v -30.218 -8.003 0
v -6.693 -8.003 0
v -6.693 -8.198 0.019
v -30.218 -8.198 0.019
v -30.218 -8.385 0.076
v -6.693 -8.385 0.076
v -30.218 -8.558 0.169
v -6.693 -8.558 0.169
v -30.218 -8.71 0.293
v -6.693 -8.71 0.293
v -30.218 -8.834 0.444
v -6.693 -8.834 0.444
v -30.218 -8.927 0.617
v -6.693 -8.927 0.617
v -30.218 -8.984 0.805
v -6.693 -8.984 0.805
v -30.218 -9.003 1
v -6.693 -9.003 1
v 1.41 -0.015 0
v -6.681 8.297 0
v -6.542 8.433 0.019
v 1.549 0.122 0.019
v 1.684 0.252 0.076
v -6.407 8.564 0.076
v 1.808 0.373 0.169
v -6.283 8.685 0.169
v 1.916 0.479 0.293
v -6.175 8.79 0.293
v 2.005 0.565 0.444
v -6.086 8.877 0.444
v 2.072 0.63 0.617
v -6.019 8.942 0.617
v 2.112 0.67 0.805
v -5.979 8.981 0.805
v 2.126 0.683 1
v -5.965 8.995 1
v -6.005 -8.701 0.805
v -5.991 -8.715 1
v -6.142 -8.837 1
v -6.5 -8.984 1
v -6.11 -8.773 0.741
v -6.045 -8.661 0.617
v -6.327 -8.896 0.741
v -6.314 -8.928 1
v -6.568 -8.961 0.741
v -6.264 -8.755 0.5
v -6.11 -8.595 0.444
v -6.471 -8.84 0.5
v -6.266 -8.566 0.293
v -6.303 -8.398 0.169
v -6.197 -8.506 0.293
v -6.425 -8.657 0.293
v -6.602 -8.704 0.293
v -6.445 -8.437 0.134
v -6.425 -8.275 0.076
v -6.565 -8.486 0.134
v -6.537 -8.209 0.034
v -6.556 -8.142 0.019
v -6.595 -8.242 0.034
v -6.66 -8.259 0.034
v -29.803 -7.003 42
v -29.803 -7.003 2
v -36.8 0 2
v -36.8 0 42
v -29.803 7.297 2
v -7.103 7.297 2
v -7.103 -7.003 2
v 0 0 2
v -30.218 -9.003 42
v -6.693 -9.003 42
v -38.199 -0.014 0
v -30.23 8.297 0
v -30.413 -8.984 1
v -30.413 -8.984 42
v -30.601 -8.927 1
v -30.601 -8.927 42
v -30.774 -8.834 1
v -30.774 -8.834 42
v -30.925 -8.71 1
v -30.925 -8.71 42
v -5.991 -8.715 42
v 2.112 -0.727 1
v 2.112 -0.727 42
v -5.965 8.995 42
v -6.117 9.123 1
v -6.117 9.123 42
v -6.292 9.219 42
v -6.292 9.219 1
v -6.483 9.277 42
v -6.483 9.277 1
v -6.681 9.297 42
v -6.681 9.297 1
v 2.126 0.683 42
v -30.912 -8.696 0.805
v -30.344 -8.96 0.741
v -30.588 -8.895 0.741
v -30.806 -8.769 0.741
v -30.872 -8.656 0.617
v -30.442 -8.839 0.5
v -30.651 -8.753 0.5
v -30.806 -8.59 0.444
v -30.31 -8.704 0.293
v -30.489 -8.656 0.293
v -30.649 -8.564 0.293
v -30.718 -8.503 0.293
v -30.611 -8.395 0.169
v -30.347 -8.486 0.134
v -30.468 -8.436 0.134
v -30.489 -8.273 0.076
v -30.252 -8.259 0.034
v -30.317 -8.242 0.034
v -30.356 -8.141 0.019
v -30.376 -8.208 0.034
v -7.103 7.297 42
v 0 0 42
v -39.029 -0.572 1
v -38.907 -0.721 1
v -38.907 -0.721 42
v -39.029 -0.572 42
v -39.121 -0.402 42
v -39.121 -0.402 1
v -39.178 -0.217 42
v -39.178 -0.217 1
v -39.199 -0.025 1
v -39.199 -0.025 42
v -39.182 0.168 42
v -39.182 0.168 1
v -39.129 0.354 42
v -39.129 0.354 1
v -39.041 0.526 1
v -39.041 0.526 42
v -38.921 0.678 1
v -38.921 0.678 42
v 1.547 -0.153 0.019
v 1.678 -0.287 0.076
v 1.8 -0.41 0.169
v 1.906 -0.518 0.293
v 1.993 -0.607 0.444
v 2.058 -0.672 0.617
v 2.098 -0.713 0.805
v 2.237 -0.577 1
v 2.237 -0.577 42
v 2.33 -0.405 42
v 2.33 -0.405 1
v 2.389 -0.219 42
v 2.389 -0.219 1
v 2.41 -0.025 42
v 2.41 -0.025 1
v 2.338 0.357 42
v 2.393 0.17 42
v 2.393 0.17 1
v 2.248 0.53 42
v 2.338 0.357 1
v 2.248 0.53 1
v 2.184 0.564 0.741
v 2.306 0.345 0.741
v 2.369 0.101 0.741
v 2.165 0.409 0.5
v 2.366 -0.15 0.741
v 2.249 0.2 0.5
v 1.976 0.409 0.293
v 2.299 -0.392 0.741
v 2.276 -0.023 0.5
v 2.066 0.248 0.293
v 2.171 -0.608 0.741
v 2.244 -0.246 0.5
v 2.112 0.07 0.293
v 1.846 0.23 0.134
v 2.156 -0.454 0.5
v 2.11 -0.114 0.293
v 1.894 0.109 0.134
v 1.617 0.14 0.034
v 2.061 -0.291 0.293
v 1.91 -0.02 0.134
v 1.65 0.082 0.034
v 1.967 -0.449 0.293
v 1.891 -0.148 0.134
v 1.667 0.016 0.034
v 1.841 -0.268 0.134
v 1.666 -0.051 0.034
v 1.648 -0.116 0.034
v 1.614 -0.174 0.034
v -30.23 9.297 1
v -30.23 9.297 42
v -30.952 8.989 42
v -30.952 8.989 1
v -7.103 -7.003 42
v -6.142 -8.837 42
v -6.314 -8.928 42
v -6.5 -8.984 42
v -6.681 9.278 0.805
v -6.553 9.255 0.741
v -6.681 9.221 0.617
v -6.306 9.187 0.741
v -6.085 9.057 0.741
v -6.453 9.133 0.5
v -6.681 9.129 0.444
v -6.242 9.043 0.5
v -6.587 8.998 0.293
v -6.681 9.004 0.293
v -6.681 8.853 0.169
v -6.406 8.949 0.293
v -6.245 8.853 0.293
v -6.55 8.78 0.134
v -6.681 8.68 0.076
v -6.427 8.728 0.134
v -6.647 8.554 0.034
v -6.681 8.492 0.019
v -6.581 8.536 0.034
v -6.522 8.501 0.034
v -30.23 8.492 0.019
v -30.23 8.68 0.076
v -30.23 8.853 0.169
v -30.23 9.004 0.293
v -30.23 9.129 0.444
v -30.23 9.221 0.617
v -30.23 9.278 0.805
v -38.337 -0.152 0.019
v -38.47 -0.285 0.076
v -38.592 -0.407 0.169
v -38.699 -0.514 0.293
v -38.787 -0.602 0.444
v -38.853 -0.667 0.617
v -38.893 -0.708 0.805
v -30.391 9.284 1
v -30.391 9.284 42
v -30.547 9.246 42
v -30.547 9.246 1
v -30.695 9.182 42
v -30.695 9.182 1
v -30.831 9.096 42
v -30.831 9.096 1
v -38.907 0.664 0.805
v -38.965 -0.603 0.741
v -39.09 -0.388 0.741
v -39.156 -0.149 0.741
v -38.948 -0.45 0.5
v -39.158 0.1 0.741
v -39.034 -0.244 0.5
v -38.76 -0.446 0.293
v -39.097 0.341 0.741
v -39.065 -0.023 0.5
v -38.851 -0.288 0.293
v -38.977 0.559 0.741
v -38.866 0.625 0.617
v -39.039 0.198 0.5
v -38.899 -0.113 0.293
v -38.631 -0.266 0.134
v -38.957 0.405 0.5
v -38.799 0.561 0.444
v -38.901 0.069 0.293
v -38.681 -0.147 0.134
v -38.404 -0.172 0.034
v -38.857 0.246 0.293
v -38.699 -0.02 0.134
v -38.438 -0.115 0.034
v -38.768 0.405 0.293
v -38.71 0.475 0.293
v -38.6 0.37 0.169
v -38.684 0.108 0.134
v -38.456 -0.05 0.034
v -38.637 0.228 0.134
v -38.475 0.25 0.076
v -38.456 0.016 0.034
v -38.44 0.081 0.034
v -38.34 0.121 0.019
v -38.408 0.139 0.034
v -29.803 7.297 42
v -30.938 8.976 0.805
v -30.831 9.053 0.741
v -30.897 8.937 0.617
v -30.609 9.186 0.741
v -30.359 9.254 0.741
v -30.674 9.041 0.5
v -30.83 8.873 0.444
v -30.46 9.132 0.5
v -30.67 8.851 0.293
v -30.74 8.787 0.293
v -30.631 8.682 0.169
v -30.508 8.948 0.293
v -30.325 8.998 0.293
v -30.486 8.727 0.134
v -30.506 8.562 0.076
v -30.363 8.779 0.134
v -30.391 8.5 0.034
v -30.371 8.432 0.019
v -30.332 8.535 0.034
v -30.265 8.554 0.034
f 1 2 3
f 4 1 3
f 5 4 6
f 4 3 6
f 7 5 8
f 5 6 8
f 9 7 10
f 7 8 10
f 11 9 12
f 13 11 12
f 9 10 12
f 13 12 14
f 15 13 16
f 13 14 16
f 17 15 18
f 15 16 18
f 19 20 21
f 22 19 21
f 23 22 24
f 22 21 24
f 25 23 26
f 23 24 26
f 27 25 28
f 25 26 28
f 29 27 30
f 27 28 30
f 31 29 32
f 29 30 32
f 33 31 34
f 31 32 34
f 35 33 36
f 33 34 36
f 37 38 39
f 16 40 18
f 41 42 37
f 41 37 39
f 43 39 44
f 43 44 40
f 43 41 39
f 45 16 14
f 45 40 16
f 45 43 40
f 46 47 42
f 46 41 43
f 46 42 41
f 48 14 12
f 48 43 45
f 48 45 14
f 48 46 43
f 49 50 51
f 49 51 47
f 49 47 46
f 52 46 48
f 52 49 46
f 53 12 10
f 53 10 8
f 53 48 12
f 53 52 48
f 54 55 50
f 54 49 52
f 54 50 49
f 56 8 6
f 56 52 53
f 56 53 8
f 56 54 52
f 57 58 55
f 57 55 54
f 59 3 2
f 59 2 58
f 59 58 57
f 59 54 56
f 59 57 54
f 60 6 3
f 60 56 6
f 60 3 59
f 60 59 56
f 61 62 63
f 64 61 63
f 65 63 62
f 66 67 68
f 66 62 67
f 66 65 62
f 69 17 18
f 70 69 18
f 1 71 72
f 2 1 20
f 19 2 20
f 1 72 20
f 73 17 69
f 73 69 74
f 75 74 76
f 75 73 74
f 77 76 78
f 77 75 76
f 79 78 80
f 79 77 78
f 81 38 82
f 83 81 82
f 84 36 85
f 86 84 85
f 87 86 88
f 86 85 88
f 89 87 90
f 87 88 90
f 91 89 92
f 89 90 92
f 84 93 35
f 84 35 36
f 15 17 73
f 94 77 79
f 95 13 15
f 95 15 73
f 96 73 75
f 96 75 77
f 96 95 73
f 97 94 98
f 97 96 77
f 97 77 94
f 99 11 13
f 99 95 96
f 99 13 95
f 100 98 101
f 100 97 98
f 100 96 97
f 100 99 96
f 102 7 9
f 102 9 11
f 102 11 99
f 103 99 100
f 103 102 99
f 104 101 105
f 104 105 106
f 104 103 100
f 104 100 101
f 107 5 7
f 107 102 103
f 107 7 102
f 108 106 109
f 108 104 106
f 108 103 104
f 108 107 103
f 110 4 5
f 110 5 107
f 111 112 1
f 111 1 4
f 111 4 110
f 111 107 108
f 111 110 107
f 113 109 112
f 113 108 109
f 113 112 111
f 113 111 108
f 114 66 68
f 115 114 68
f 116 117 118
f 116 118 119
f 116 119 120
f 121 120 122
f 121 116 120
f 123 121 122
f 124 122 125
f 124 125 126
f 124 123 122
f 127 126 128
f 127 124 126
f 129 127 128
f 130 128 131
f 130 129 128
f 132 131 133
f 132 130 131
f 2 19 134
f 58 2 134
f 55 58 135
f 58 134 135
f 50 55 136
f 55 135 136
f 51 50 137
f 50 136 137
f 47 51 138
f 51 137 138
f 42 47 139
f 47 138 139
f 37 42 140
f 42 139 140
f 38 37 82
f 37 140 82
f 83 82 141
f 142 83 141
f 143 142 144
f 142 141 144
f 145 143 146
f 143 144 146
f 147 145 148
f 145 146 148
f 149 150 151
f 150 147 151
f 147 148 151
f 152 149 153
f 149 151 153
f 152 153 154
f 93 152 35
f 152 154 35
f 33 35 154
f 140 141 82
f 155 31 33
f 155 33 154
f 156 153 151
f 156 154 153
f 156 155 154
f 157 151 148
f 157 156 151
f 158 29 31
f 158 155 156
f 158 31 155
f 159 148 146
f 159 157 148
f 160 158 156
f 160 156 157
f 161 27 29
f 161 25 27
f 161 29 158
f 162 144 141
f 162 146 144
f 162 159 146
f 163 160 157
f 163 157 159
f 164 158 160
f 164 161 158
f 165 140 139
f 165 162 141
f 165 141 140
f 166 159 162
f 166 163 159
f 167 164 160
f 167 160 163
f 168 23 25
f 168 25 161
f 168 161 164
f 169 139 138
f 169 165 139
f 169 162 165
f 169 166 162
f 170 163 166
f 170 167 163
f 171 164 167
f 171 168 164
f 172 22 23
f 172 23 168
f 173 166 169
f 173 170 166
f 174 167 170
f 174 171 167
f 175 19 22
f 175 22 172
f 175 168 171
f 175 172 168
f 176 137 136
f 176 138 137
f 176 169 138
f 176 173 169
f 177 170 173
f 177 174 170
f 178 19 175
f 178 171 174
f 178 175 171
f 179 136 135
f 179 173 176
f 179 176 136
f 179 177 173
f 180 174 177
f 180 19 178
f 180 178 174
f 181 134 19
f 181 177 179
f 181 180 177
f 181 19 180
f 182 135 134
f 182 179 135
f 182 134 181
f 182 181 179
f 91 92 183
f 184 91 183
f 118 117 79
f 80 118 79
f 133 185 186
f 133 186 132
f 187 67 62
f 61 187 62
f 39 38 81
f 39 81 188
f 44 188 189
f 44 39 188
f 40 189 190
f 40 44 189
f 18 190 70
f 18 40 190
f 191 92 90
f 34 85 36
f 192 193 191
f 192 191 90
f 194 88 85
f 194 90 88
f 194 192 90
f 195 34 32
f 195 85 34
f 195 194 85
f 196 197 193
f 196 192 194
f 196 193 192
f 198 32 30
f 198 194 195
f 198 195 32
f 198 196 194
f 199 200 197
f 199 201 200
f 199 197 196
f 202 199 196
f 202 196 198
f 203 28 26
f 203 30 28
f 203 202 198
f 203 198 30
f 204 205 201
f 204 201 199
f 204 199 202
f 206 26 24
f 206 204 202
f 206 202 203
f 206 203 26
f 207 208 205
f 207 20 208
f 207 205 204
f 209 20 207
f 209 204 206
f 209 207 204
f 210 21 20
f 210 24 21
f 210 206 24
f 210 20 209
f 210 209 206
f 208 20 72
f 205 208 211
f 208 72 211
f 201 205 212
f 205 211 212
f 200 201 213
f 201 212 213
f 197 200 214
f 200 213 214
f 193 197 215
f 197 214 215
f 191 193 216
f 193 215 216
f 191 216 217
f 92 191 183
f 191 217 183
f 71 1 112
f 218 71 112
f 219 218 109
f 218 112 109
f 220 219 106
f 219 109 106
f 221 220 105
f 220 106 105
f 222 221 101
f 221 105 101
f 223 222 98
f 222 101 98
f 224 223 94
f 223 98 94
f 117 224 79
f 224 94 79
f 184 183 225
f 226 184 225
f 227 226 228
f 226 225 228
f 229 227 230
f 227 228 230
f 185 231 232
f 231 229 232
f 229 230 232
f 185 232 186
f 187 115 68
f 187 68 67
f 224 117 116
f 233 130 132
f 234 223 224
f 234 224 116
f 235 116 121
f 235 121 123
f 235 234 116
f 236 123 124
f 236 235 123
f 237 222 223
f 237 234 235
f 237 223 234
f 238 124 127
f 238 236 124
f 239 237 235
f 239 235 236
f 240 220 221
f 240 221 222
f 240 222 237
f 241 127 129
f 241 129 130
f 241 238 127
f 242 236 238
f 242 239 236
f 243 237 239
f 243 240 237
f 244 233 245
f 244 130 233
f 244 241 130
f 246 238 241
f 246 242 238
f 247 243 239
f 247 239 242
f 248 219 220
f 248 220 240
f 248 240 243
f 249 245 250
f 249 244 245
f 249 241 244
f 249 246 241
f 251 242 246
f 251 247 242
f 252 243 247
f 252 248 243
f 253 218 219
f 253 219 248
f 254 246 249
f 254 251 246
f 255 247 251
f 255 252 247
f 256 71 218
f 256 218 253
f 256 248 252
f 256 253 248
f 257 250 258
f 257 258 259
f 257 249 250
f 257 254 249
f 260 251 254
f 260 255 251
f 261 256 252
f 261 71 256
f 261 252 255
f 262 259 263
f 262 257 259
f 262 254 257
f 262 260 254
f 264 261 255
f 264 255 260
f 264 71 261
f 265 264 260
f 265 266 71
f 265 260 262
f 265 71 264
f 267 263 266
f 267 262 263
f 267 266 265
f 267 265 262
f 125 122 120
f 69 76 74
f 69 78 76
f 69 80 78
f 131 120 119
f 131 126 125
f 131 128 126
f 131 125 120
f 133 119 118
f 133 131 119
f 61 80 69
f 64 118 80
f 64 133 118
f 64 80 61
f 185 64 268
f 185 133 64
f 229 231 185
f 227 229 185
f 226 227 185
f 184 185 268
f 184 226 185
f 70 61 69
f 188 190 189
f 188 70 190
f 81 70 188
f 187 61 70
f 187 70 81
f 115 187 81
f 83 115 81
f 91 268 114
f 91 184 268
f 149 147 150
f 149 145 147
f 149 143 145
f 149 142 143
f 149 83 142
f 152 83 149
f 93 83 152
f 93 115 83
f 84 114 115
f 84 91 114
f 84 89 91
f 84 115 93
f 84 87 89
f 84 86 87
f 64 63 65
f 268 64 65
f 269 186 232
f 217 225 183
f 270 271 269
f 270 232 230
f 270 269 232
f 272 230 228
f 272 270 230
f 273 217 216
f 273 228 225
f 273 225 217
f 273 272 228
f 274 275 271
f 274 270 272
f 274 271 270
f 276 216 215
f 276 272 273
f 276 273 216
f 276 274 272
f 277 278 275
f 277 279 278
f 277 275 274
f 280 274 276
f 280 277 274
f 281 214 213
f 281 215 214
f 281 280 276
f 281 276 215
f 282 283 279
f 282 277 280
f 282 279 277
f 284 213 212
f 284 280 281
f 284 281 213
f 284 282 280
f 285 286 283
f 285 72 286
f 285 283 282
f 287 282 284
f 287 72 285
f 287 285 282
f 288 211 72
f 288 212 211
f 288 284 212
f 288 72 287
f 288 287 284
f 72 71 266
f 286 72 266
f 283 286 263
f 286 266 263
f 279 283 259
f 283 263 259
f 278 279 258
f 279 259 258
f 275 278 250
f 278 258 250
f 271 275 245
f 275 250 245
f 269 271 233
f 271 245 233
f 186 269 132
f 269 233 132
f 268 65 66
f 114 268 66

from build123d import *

# Parameters (mm, degrees)
F1_DEPTH     = 42
F2_DEPTH     = 2
F3_R         = 1
F4_T1_DEPTH  = 43.446869231
F4_T3_DEPTH  = 42.0361861213
F4_T5_DEPTH  = 42.0250945478
F4_T7_DEPTH  = 43.4842607953
F4_T9_DEPTH  = 42.0552929075
F4_T11_DEPTH = 42.0664740253
F4_T16_DEPTH = 1
F4_T22_DEPTH = 1
F4_T28_DEPTH = 1
F4_T34_DEPTH = 1
F4_T40_DEPTH = 1
F4_T46_DEPTH = 1


# Not quite as in the source:
# - a fillet or chamfer that OpenCascade refuses, or shapes differently, is made with other operations: its cross-section is extruded or revolved along the edge and cut away or added


with BuildPart() as f1:
    # F0 (on Top) → F1 (new body)
    with BuildSketch(Plane.XY):
        Polygon((-6.2833941388, -9.0027643815), (2.8193882778, -0.0290314764), (-6.2592354511, 9.2972356185), (-30.6566489974, 9.2972356185), (-39.5983849299, -0.0288091293), (-30.6324186742, -9.0027643815), align=None)
        Polygon((-7.1034697771, 7.2972356185), (0, 0), (-7.1034697771, -7.0027643815), (-29.8034697771, -7.0027643815), (-36.8, 0), (-29.8034697771, 7.2972356185), align=None, mode=Mode.SUBTRACT)
    extrude(amount=F1_DEPTH)

    # F0 (on Top) → F2 (join)
    with BuildSketch(Plane.XY):
        Polygon((-7.1034697771, -7.0027643815), (0, 0), (-7.1034697771, 7.2972356185), (-29.8034697771, 7.2972356185), (-36.8, 0), (-29.8034697771, -7.0027643815), align=None)
    extrude(amount=F2_DEPTH)

    # F3
    f3_edges = [f1.edges().sort_by_distance(p)[0] for p in [
        (-1.719924, 4.634102, 0),
        (-18.457942, 9.297236, 0),
        (-35.127517, 4.634213, 0),
        (-35.115402, -4.515787, 0),
        (-18.457906, -9.002764, 0),
        (-1.732003, -4.515898, 0),
    ]]
    fillet(f3_edges, radius=F3_R)

    # F4: fillet of radius 1 on 6 edges, made by hand

    # F4_s2 → F4_t1 (cut)
    with BuildSketch(Plane.XY.offset(1)):
        with BuildLine():
            ThreePointArc((-38.9066140644, -0.7211963873), (-39.1991394765, -0.0246989321), (-38.9210153062, 0.6776733109))
            Line((-38.9210153062, 0.6776733109), (-39.5983849299, -0.0288091293))
            Line((-39.5983849299, -0.0288091293), (-38.9066140644, -0.7211963873))
        make_face()
    extrude(amount=F4_T1_DEPTH, mode=Mode.SUBTRACT)

    # F4_s4 → F4_t3 (cut)
    with BuildSketch(Plane.XY.offset(1)):
        with BuildLine():
            ThreePointArc((-30.2179442256, -9.0027643815), (-30.6008333593, -8.9265586829), (-30.9253658251, -8.7095562041))
            Line((-30.9253658251, -8.7095562041), (-30.6324186742, -9.0027643815))
            Line((-30.6324186742, -9.0027643815), (-30.2179442256, -9.0027643815))
        make_face()
    extrude(amount=F4_T3_DEPTH, mode=Mode.SUBTRACT)

    # F4_s6 → F4_t5 (cut)
    with BuildSketch(Plane.XY.offset(1)):
        with BuildLine():
            ThreePointArc((-5.9913911517, -8.7149011003), (-6.3140487209, -8.9280040042), (-6.693431958, -9.0027643815))
            Line((-6.693431958, -9.0027643815), (-6.2833941388, -9.0027643815))
            Line((-6.2833941388, -9.0027643815), (-5.9913911517, -8.7149011003))
        make_face()
    extrude(amount=F4_T5_DEPTH, mode=Mode.SUBTRACT)

    # F4_s8 → F4_t7 (cut)
    with BuildSketch(Plane.XY.offset(1)):
        with BuildLine():
            ThreePointArc((2.1117349451, -0.726652457), (2.4096411281, -0.0248122758), (2.1262503938, 0.6830135684))
            Line((2.1262503938, 0.6830135684), (2.8193882778, -0.0290314764))
            Line((2.8193882778, -0.0290314764), (2.1117349451, -0.726652457))
        make_face()
    extrude(amount=F4_T7_DEPTH, mode=Mode.SUBTRACT)

    # F4_s10 → F4_t9 (cut)
    with BuildSketch(Plane.XY.offset(1)):
        with BuildLine():
            ThreePointArc((-5.9647963592, 8.9947649251), (-6.2924627239, 9.2185198598), (-6.6813526141, 9.2972356185))
            Line((-6.6813526141, 9.2972356185), (-6.2592354511, 9.2972356185))
            Line((-6.2592354511, 9.2972356185), (-5.9647963592, 8.9947649251))
        make_face()
    extrude(amount=F4_T9_DEPTH, mode=Mode.SUBTRACT)

    # F4_s12 → F4_t11 (cut)
    with BuildSketch(Plane.XY.offset(1)):
        with BuildLine():
            ThreePointArc((-30.2300593872, 9.2972356185), (-30.6224381102, 9.2170393681), (-30.9518822285, 8.9893134941))
            Line((-30.9518822285, 8.9893134941), (-30.6566489974, 9.2972356185))
            Line((-30.6566489974, 9.2972356185), (-30.2300593872, 9.2972356185))
        make_face()
    extrude(amount=F4_T11_DEPTH, mode=Mode.SUBTRACT)


with BuildPart() as f4_tool14:
    # F4_s15 → F4_t16 (new body)
    with BuildSketch(Plane.XY.offset(1)):
        Polygon((-30.2300593872, 8.2972356185), (-30.2300593872, 9.2972356185), (-30.6566489974, 9.2972356185), (-30.9518822285, 8.9893134941), align=None)
    extrude(amount=-F4_T16_DEPTH)

    # F4_s17 → F4_t18 (revolve, cut)
    with BuildSketch(Plane(origin=(-30.2300593872, 8.2972356185, 1), x_dir=(0.3923787229, -0.9198037496, 0), z_dir=(0.9198037496, 0.3923787229, 0))):
        with BuildLine():
            ThreePointArc((0, -1), (1, 0), (0, 1))
            Line((0, 1), (0, -1))
        make_face()
    revolve(axis=Axis((-30.2300593872, 8.2972356185, 1), (0, 0, -1)), mode=Mode.SUBTRACT)


with BuildPart() as f1_1:
    add(f1.part)

    # F4_t13: cut F4_tool14
    add(f4_tool14.part, mode=Mode.SUBTRACT)


with BuildPart() as f4_tool20:
    # F4_s21 → F4_t22 (new body)
    with BuildSketch(Plane.XY.offset(1)):
        Polygon((-6.6813526141, 8.2972356185), (-5.9647963592, 8.9947649251), (-6.2592354511, 9.2972356185), (-6.6813526141, 9.2972356185), align=None)
    extrude(amount=-F4_T22_DEPTH)

    # F4_s23 → F4_t24 (revolve, cut)
    with BuildSketch(Plane(origin=(-6.6813526141, 8.2972356185, 1), x_dir=(-0.3888898902, -0.9212842413, 0), z_dir=(0.9212842413, -0.3888898902, 0))):
        with BuildLine():
            ThreePointArc((0, -1), (1, 0), (0, 1))
            Line((0, 1), (0, -1))
        make_face()
    revolve(axis=Axis((-6.6813526141, 8.2972356185, 1), (0, 0, -1)), mode=Mode.SUBTRACT)


with BuildPart() as f1_2:
    add(f1_1.part)

    # F4_t19: cut F4_tool20
    add(f4_tool20.part, mode=Mode.SUBTRACT)


with BuildPart() as f4_tool26:
    # F4_s27 → F4_t28 (new body)
    with BuildSketch(Plane.XY.offset(1)):
        Polygon((1.4096941389, -0.0145157382), (2.1117349451, -0.726652457), (2.8193882778, -0.0290314764), (2.1262503938, 0.6830135684), align=None)
    extrude(amount=-F4_T28_DEPTH)

    # F4_s29 → F4_t30 (revolve, cut)
    with BuildSketch(Plane(origin=(1.4096941389, -0.0145157382, 1), x_dir=(-0.9999469893, 0.0102965376, 0), z_dir=(-0.0102965376, -0.9999469893, 0))):
        with BuildLine():
            ThreePointArc((0, -1), (1, 0), (0, 1))
            Line((0, 1), (0, -1))
        make_face()
    revolve(axis=Axis((1.4096941389, -0.0145157382, 1), (0, 0, -1)), mode=Mode.SUBTRACT)


with BuildPart() as f1_3:
    add(f1_2.part)

    # F4_t25: cut F4_tool26
    add(f4_tool26.part, mode=Mode.SUBTRACT)


with BuildPart() as f4_tool32:
    # F4_s33 → F4_t34 (new body)
    with BuildSketch(Plane.XY.offset(1)):
        Polygon((-6.693431958, -8.0027643815), (-5.9913911517, -8.7149011003), (-6.2833941388, -9.0027643815), (-6.693431958, -9.0027643815), align=None)
    extrude(amount=-F4_T34_DEPTH)

    # F4_s35 → F4_t36 (revolve, cut)
    with BuildSketch(Plane(origin=(-6.693431958, -8.0027643815, 1), x_dir=(-0.3793832371, 0.9252396227, 0), z_dir=(-0.9252396227, -0.3793832371, 0))):
        with BuildLine():
            ThreePointArc((0, -1), (1, 0), (0, 1))
            Line((0, 1), (0, -1))
        make_face()
    revolve(axis=Axis((-6.693431958, -8.0027643815, 1), (0, 0, -1)), mode=Mode.SUBTRACT)


with BuildPart() as f1_4:
    add(f1_3.part)

    # F4_t31: cut F4_tool32
    add(f4_tool32.part, mode=Mode.SUBTRACT)


with BuildPart() as f4_tool38:
    # F4_s39 → F4_t40 (new body)
    with BuildSketch(Plane.XY.offset(1)):
        Polygon((-30.2179442256, -8.0027643815), (-30.2179442256, -9.0027643815), (-30.6324186742, -9.0027643815), (-30.9253658251, -8.7095562041), align=None)
    extrude(amount=-F4_T40_DEPTH)

    # F4_s41 → F4_t42 (revolve, cut)
    with BuildSketch(Plane(origin=(-30.2179442256, -8.0027643815, 1), x_dir=(0.3828891336, 0.9237943014, 0), z_dir=(-0.9237943014, 0.3828891336, 0))):
        with BuildLine():
            ThreePointArc((0, -1), (1, 0), (0, 1))
            Line((0, 1), (0, -1))
        make_face()
    revolve(axis=Axis((-30.2179442256, -8.0027643815, 1), (0, 0, -1)), mode=Mode.SUBTRACT)


with BuildPart() as f1_5:
    add(f1_4.part)

    # F4_t37: cut F4_tool38
    add(f4_tool38.part, mode=Mode.SUBTRACT)


with BuildPart() as f4_tool44:
    # F4_s45 → F4_t46 (new body)
    with BuildSketch(Plane.XY.offset(1)):
        Polygon((-38.1991924649, -0.0144045646), (-38.9066140644, -0.7211963873), (-39.5983849299, -0.0288091293), (-38.9210153062, 0.6776733109), align=None)
    extrude(amount=-F4_T46_DEPTH)

    # F4_s47 → F4_t48 (revolve, cut)
    with BuildSketch(Plane(origin=(-38.1991924649, -0.0144045646, 1), x_dir=(0.9999470116, 0.0102943674, 0), z_dir=(-0.0102943674, 0.9999470116, 0))):
        with BuildLine():
            ThreePointArc((0, -1), (1, 0), (0, 1))
            Line((0, 1), (0, -1))
        make_face()
    revolve(axis=Axis((-38.1991924649, -0.0144045646, 1), (0, 0, -1)), mode=Mode.SUBTRACT)


with BuildPart() as f1_6:
    add(f1_5.part)

    # F4_t43: cut F4_tool44
    add(f4_tool44.part, mode=Mode.SUBTRACT)


solid = f1_6.part
